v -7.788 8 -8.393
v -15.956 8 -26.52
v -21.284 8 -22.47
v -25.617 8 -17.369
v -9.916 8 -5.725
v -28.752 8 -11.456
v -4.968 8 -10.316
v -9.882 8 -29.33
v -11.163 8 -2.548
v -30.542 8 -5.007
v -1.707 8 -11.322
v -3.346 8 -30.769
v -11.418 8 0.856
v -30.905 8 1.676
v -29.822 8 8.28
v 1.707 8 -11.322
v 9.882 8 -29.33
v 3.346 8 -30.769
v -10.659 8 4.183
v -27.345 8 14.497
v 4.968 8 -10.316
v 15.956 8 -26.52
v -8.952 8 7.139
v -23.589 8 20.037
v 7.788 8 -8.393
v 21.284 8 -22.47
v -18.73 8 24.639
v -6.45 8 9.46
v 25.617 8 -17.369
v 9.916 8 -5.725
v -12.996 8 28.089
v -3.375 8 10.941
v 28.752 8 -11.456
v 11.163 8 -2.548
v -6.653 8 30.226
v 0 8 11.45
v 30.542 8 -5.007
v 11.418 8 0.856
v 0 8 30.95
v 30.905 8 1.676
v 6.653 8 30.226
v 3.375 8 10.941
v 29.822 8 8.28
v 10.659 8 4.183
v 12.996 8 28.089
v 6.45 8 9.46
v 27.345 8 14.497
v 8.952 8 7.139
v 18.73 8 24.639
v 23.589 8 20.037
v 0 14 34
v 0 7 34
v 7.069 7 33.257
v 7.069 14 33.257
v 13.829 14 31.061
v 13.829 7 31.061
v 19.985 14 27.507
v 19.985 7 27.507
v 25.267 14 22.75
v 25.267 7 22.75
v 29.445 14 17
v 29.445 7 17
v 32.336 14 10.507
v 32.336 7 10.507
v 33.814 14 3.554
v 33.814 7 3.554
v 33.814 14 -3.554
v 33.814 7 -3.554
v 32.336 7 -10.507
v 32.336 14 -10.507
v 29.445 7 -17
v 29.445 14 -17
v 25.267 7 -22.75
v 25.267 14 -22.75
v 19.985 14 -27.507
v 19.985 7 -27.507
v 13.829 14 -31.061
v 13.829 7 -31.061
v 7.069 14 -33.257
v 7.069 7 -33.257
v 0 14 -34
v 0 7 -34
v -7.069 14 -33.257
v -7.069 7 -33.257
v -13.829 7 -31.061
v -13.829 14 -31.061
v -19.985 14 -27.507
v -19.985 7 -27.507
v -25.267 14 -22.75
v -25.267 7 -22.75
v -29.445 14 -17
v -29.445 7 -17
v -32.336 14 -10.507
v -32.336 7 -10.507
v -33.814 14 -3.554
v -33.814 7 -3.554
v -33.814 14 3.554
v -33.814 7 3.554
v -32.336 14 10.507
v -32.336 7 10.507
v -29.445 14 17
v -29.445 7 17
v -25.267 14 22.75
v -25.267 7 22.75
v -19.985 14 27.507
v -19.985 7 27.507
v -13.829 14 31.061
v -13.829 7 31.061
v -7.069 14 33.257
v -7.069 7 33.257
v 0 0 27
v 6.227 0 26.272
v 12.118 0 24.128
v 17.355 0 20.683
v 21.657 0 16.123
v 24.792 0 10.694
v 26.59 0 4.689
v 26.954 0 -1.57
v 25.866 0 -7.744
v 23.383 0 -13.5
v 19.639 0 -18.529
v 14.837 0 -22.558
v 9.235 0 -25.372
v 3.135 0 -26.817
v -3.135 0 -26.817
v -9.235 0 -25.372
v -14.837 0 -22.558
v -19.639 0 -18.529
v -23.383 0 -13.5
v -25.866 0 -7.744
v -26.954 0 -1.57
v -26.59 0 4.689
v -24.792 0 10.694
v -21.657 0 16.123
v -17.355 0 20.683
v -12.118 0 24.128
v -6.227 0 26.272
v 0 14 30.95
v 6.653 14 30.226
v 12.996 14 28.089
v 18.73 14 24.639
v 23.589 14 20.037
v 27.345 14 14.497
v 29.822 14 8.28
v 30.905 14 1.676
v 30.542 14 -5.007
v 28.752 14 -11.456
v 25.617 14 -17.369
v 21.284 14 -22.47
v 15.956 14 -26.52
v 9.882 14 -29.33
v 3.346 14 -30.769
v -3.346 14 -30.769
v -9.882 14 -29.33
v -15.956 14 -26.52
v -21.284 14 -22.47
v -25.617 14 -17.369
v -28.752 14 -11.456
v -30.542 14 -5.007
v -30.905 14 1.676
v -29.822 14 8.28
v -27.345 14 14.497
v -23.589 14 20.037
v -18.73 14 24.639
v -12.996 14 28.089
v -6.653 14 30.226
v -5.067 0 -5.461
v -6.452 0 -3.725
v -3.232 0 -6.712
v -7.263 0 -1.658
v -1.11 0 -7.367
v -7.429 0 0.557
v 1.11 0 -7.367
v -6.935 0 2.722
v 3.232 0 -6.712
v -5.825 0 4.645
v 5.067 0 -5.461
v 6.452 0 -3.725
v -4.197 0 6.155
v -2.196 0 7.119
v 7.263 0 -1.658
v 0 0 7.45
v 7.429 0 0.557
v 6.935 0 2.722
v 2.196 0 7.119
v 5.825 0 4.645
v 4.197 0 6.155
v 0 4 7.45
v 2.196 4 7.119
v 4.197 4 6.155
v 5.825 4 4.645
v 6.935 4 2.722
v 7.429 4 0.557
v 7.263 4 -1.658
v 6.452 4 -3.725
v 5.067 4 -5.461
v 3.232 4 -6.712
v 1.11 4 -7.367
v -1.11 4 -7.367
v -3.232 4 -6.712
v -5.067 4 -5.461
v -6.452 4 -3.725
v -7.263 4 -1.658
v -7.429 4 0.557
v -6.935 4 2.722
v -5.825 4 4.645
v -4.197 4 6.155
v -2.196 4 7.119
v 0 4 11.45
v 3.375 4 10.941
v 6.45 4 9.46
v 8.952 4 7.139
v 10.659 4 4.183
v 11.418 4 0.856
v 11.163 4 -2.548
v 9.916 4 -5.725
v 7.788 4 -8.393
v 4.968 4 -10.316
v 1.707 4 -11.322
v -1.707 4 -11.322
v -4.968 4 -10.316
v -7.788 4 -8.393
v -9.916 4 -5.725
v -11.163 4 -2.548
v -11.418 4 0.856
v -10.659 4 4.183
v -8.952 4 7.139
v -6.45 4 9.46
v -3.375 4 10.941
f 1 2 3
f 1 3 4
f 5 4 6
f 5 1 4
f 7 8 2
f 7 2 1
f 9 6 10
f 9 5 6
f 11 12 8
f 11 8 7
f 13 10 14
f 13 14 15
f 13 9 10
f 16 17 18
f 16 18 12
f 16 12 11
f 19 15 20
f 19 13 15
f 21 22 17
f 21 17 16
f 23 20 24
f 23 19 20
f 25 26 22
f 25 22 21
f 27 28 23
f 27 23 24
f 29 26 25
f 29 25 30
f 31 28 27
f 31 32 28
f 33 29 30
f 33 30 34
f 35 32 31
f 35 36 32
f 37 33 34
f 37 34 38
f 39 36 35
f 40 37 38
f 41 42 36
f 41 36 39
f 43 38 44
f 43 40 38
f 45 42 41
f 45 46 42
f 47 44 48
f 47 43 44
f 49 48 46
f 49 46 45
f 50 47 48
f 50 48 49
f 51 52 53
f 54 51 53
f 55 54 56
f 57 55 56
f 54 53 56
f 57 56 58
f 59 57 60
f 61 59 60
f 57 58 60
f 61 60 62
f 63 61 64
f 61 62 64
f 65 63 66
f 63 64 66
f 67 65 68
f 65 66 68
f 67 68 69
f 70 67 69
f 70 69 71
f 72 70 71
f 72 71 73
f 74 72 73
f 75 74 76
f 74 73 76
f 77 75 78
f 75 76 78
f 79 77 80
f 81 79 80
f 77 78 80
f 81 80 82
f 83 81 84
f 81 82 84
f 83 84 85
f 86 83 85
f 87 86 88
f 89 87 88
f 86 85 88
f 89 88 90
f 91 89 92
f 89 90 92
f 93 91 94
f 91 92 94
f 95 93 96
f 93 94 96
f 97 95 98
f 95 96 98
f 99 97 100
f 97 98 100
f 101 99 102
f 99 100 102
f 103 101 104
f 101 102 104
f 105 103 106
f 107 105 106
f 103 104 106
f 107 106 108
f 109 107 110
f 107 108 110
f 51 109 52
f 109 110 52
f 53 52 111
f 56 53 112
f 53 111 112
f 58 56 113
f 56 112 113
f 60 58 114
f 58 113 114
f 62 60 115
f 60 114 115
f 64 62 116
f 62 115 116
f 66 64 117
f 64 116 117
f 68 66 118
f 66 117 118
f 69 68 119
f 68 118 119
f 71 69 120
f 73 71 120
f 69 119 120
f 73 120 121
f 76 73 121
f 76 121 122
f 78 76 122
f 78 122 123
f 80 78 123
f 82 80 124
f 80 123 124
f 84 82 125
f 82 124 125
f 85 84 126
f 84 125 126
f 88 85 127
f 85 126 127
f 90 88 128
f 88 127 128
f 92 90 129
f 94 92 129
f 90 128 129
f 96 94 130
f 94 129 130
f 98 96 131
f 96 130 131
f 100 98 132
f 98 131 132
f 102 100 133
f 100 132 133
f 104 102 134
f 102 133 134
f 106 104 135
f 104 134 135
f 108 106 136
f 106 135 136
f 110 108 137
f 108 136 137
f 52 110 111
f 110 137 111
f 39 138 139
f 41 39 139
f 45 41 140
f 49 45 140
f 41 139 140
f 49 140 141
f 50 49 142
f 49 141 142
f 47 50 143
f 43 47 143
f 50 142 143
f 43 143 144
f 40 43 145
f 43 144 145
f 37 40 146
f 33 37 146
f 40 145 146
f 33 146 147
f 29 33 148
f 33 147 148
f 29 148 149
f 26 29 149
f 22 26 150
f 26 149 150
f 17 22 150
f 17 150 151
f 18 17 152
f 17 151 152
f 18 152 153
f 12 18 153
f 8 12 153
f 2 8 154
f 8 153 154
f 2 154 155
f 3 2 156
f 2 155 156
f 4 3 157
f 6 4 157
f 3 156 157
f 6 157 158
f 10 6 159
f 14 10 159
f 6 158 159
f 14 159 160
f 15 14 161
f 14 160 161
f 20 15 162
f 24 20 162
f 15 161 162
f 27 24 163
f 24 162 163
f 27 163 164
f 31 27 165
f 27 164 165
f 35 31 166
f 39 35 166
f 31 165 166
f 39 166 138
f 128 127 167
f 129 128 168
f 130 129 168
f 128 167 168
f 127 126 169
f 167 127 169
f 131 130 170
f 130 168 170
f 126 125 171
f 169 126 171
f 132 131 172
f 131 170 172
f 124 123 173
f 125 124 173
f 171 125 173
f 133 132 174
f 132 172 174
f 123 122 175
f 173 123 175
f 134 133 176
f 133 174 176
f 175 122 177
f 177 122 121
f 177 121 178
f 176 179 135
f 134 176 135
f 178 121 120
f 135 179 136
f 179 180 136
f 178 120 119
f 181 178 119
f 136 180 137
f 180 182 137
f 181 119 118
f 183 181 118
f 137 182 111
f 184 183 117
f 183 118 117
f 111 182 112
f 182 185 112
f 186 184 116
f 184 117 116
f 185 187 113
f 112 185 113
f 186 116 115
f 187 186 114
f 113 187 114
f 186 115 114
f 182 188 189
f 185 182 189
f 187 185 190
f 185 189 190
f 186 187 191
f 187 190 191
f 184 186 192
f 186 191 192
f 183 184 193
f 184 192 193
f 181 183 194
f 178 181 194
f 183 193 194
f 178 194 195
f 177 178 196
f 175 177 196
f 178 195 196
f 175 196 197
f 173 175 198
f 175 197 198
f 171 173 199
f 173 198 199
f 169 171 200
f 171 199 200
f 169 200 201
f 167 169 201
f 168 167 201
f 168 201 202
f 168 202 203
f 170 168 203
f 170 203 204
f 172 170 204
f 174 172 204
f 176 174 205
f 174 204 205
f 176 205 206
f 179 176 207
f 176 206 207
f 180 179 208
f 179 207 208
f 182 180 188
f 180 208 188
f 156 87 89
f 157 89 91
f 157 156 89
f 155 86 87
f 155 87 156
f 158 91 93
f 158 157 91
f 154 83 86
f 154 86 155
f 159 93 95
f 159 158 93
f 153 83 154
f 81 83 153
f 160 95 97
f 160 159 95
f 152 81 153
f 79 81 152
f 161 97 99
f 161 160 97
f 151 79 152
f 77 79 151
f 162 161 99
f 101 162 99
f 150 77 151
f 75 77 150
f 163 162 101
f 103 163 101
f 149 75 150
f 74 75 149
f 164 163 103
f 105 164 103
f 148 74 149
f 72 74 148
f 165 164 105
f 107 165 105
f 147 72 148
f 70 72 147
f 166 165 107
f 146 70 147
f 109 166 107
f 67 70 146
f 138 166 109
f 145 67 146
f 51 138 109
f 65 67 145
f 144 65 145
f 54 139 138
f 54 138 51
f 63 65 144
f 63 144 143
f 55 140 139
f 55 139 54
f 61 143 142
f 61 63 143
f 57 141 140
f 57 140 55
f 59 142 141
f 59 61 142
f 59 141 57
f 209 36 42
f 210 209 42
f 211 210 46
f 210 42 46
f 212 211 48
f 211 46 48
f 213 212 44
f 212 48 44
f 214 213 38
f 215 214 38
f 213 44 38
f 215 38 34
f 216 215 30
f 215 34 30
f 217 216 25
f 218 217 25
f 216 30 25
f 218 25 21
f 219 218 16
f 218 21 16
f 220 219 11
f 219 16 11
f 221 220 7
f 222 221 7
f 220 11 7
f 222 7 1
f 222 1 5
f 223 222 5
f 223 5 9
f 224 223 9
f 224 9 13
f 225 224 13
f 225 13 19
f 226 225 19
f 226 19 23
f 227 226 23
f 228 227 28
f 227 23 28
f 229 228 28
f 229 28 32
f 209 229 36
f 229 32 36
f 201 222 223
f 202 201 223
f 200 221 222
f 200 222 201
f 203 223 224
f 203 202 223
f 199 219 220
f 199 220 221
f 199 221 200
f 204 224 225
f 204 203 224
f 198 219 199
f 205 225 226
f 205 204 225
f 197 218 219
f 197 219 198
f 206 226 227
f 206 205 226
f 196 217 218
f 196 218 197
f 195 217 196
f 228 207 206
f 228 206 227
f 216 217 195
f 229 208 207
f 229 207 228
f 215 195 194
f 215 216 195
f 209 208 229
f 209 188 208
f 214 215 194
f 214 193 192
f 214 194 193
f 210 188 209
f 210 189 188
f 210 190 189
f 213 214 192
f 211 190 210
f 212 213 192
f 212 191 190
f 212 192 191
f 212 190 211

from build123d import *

# Parameters (mm, degrees)
SKETCH1_R           = 34
BOSS_EXTRUDE1_DEPTH = 14
SKETCH2_R           = 30.95
CUT_EXTRUDE1_DEPTH  = 6
SKETCH3_R           = 11.45
CUT_EXTRUDE2_DEPTH  = 4
SKETCH4_R           = 7.45
CUT_EXTRUDE3_DEPTH  = 4
CHAMFER1_SIZE       = 7


with BuildPart() as part:
    # Sketch1 → Boss-Extrude1 (new body)
    with BuildSketch(Plane(origin=(0, 0, 0), x_dir=(1, 0, 0), z_dir=(0, 1, 0))):
        with Locations(Location((0, 0, 0), (0, 0, 270))):
            Circle(SKETCH1_R)
    extrude(amount=BOSS_EXTRUDE1_DEPTH)

    # Sketch2 → Cut-Extrude1 (cut)
    with BuildSketch(Plane(origin=(0, 14, 0), x_dir=(1, 0, 0), z_dir=(0, 1, 0))):
        with Locations(Location((0, 0, 0), (0, 0, 270))):
            Circle(SKETCH2_R)
    extrude(amount=-CUT_EXTRUDE1_DEPTH, mode=Mode.SUBTRACT)

    # Sketch3 → Cut-Extrude2 (cut)
    with BuildSketch(Plane(origin=(0, 8, 0), x_dir=(1, 0, 0), z_dir=(0, 1, 0))):
        with Locations(Location((0, 0, 0), (0, 0, 270))):
            Circle(SKETCH3_R)
    extrude(amount=-CUT_EXTRUDE2_DEPTH, mode=Mode.SUBTRACT)

    # Sketch4 → Cut-Extrude3 (cut)
    with BuildSketch(Plane(origin=(0, 4, 0), x_dir=(1, 0, 0), z_dir=(0, 1, 0))):
        with Locations(Location((0, 0, 0), (0, 0, 270))):
            Circle(SKETCH4_R)
    extrude(amount=-CUT_EXTRUDE3_DEPTH, mode=Mode.SUBTRACT)

    # Chamfer1
    chamfer1_edges = [part.edges().sort_by_distance(p)[0] for p in [
        (0, 0, -34),
    ]]
    chamfer(chamfer1_edges, length=CHAMFER1_SIZE)


solid = part.part
